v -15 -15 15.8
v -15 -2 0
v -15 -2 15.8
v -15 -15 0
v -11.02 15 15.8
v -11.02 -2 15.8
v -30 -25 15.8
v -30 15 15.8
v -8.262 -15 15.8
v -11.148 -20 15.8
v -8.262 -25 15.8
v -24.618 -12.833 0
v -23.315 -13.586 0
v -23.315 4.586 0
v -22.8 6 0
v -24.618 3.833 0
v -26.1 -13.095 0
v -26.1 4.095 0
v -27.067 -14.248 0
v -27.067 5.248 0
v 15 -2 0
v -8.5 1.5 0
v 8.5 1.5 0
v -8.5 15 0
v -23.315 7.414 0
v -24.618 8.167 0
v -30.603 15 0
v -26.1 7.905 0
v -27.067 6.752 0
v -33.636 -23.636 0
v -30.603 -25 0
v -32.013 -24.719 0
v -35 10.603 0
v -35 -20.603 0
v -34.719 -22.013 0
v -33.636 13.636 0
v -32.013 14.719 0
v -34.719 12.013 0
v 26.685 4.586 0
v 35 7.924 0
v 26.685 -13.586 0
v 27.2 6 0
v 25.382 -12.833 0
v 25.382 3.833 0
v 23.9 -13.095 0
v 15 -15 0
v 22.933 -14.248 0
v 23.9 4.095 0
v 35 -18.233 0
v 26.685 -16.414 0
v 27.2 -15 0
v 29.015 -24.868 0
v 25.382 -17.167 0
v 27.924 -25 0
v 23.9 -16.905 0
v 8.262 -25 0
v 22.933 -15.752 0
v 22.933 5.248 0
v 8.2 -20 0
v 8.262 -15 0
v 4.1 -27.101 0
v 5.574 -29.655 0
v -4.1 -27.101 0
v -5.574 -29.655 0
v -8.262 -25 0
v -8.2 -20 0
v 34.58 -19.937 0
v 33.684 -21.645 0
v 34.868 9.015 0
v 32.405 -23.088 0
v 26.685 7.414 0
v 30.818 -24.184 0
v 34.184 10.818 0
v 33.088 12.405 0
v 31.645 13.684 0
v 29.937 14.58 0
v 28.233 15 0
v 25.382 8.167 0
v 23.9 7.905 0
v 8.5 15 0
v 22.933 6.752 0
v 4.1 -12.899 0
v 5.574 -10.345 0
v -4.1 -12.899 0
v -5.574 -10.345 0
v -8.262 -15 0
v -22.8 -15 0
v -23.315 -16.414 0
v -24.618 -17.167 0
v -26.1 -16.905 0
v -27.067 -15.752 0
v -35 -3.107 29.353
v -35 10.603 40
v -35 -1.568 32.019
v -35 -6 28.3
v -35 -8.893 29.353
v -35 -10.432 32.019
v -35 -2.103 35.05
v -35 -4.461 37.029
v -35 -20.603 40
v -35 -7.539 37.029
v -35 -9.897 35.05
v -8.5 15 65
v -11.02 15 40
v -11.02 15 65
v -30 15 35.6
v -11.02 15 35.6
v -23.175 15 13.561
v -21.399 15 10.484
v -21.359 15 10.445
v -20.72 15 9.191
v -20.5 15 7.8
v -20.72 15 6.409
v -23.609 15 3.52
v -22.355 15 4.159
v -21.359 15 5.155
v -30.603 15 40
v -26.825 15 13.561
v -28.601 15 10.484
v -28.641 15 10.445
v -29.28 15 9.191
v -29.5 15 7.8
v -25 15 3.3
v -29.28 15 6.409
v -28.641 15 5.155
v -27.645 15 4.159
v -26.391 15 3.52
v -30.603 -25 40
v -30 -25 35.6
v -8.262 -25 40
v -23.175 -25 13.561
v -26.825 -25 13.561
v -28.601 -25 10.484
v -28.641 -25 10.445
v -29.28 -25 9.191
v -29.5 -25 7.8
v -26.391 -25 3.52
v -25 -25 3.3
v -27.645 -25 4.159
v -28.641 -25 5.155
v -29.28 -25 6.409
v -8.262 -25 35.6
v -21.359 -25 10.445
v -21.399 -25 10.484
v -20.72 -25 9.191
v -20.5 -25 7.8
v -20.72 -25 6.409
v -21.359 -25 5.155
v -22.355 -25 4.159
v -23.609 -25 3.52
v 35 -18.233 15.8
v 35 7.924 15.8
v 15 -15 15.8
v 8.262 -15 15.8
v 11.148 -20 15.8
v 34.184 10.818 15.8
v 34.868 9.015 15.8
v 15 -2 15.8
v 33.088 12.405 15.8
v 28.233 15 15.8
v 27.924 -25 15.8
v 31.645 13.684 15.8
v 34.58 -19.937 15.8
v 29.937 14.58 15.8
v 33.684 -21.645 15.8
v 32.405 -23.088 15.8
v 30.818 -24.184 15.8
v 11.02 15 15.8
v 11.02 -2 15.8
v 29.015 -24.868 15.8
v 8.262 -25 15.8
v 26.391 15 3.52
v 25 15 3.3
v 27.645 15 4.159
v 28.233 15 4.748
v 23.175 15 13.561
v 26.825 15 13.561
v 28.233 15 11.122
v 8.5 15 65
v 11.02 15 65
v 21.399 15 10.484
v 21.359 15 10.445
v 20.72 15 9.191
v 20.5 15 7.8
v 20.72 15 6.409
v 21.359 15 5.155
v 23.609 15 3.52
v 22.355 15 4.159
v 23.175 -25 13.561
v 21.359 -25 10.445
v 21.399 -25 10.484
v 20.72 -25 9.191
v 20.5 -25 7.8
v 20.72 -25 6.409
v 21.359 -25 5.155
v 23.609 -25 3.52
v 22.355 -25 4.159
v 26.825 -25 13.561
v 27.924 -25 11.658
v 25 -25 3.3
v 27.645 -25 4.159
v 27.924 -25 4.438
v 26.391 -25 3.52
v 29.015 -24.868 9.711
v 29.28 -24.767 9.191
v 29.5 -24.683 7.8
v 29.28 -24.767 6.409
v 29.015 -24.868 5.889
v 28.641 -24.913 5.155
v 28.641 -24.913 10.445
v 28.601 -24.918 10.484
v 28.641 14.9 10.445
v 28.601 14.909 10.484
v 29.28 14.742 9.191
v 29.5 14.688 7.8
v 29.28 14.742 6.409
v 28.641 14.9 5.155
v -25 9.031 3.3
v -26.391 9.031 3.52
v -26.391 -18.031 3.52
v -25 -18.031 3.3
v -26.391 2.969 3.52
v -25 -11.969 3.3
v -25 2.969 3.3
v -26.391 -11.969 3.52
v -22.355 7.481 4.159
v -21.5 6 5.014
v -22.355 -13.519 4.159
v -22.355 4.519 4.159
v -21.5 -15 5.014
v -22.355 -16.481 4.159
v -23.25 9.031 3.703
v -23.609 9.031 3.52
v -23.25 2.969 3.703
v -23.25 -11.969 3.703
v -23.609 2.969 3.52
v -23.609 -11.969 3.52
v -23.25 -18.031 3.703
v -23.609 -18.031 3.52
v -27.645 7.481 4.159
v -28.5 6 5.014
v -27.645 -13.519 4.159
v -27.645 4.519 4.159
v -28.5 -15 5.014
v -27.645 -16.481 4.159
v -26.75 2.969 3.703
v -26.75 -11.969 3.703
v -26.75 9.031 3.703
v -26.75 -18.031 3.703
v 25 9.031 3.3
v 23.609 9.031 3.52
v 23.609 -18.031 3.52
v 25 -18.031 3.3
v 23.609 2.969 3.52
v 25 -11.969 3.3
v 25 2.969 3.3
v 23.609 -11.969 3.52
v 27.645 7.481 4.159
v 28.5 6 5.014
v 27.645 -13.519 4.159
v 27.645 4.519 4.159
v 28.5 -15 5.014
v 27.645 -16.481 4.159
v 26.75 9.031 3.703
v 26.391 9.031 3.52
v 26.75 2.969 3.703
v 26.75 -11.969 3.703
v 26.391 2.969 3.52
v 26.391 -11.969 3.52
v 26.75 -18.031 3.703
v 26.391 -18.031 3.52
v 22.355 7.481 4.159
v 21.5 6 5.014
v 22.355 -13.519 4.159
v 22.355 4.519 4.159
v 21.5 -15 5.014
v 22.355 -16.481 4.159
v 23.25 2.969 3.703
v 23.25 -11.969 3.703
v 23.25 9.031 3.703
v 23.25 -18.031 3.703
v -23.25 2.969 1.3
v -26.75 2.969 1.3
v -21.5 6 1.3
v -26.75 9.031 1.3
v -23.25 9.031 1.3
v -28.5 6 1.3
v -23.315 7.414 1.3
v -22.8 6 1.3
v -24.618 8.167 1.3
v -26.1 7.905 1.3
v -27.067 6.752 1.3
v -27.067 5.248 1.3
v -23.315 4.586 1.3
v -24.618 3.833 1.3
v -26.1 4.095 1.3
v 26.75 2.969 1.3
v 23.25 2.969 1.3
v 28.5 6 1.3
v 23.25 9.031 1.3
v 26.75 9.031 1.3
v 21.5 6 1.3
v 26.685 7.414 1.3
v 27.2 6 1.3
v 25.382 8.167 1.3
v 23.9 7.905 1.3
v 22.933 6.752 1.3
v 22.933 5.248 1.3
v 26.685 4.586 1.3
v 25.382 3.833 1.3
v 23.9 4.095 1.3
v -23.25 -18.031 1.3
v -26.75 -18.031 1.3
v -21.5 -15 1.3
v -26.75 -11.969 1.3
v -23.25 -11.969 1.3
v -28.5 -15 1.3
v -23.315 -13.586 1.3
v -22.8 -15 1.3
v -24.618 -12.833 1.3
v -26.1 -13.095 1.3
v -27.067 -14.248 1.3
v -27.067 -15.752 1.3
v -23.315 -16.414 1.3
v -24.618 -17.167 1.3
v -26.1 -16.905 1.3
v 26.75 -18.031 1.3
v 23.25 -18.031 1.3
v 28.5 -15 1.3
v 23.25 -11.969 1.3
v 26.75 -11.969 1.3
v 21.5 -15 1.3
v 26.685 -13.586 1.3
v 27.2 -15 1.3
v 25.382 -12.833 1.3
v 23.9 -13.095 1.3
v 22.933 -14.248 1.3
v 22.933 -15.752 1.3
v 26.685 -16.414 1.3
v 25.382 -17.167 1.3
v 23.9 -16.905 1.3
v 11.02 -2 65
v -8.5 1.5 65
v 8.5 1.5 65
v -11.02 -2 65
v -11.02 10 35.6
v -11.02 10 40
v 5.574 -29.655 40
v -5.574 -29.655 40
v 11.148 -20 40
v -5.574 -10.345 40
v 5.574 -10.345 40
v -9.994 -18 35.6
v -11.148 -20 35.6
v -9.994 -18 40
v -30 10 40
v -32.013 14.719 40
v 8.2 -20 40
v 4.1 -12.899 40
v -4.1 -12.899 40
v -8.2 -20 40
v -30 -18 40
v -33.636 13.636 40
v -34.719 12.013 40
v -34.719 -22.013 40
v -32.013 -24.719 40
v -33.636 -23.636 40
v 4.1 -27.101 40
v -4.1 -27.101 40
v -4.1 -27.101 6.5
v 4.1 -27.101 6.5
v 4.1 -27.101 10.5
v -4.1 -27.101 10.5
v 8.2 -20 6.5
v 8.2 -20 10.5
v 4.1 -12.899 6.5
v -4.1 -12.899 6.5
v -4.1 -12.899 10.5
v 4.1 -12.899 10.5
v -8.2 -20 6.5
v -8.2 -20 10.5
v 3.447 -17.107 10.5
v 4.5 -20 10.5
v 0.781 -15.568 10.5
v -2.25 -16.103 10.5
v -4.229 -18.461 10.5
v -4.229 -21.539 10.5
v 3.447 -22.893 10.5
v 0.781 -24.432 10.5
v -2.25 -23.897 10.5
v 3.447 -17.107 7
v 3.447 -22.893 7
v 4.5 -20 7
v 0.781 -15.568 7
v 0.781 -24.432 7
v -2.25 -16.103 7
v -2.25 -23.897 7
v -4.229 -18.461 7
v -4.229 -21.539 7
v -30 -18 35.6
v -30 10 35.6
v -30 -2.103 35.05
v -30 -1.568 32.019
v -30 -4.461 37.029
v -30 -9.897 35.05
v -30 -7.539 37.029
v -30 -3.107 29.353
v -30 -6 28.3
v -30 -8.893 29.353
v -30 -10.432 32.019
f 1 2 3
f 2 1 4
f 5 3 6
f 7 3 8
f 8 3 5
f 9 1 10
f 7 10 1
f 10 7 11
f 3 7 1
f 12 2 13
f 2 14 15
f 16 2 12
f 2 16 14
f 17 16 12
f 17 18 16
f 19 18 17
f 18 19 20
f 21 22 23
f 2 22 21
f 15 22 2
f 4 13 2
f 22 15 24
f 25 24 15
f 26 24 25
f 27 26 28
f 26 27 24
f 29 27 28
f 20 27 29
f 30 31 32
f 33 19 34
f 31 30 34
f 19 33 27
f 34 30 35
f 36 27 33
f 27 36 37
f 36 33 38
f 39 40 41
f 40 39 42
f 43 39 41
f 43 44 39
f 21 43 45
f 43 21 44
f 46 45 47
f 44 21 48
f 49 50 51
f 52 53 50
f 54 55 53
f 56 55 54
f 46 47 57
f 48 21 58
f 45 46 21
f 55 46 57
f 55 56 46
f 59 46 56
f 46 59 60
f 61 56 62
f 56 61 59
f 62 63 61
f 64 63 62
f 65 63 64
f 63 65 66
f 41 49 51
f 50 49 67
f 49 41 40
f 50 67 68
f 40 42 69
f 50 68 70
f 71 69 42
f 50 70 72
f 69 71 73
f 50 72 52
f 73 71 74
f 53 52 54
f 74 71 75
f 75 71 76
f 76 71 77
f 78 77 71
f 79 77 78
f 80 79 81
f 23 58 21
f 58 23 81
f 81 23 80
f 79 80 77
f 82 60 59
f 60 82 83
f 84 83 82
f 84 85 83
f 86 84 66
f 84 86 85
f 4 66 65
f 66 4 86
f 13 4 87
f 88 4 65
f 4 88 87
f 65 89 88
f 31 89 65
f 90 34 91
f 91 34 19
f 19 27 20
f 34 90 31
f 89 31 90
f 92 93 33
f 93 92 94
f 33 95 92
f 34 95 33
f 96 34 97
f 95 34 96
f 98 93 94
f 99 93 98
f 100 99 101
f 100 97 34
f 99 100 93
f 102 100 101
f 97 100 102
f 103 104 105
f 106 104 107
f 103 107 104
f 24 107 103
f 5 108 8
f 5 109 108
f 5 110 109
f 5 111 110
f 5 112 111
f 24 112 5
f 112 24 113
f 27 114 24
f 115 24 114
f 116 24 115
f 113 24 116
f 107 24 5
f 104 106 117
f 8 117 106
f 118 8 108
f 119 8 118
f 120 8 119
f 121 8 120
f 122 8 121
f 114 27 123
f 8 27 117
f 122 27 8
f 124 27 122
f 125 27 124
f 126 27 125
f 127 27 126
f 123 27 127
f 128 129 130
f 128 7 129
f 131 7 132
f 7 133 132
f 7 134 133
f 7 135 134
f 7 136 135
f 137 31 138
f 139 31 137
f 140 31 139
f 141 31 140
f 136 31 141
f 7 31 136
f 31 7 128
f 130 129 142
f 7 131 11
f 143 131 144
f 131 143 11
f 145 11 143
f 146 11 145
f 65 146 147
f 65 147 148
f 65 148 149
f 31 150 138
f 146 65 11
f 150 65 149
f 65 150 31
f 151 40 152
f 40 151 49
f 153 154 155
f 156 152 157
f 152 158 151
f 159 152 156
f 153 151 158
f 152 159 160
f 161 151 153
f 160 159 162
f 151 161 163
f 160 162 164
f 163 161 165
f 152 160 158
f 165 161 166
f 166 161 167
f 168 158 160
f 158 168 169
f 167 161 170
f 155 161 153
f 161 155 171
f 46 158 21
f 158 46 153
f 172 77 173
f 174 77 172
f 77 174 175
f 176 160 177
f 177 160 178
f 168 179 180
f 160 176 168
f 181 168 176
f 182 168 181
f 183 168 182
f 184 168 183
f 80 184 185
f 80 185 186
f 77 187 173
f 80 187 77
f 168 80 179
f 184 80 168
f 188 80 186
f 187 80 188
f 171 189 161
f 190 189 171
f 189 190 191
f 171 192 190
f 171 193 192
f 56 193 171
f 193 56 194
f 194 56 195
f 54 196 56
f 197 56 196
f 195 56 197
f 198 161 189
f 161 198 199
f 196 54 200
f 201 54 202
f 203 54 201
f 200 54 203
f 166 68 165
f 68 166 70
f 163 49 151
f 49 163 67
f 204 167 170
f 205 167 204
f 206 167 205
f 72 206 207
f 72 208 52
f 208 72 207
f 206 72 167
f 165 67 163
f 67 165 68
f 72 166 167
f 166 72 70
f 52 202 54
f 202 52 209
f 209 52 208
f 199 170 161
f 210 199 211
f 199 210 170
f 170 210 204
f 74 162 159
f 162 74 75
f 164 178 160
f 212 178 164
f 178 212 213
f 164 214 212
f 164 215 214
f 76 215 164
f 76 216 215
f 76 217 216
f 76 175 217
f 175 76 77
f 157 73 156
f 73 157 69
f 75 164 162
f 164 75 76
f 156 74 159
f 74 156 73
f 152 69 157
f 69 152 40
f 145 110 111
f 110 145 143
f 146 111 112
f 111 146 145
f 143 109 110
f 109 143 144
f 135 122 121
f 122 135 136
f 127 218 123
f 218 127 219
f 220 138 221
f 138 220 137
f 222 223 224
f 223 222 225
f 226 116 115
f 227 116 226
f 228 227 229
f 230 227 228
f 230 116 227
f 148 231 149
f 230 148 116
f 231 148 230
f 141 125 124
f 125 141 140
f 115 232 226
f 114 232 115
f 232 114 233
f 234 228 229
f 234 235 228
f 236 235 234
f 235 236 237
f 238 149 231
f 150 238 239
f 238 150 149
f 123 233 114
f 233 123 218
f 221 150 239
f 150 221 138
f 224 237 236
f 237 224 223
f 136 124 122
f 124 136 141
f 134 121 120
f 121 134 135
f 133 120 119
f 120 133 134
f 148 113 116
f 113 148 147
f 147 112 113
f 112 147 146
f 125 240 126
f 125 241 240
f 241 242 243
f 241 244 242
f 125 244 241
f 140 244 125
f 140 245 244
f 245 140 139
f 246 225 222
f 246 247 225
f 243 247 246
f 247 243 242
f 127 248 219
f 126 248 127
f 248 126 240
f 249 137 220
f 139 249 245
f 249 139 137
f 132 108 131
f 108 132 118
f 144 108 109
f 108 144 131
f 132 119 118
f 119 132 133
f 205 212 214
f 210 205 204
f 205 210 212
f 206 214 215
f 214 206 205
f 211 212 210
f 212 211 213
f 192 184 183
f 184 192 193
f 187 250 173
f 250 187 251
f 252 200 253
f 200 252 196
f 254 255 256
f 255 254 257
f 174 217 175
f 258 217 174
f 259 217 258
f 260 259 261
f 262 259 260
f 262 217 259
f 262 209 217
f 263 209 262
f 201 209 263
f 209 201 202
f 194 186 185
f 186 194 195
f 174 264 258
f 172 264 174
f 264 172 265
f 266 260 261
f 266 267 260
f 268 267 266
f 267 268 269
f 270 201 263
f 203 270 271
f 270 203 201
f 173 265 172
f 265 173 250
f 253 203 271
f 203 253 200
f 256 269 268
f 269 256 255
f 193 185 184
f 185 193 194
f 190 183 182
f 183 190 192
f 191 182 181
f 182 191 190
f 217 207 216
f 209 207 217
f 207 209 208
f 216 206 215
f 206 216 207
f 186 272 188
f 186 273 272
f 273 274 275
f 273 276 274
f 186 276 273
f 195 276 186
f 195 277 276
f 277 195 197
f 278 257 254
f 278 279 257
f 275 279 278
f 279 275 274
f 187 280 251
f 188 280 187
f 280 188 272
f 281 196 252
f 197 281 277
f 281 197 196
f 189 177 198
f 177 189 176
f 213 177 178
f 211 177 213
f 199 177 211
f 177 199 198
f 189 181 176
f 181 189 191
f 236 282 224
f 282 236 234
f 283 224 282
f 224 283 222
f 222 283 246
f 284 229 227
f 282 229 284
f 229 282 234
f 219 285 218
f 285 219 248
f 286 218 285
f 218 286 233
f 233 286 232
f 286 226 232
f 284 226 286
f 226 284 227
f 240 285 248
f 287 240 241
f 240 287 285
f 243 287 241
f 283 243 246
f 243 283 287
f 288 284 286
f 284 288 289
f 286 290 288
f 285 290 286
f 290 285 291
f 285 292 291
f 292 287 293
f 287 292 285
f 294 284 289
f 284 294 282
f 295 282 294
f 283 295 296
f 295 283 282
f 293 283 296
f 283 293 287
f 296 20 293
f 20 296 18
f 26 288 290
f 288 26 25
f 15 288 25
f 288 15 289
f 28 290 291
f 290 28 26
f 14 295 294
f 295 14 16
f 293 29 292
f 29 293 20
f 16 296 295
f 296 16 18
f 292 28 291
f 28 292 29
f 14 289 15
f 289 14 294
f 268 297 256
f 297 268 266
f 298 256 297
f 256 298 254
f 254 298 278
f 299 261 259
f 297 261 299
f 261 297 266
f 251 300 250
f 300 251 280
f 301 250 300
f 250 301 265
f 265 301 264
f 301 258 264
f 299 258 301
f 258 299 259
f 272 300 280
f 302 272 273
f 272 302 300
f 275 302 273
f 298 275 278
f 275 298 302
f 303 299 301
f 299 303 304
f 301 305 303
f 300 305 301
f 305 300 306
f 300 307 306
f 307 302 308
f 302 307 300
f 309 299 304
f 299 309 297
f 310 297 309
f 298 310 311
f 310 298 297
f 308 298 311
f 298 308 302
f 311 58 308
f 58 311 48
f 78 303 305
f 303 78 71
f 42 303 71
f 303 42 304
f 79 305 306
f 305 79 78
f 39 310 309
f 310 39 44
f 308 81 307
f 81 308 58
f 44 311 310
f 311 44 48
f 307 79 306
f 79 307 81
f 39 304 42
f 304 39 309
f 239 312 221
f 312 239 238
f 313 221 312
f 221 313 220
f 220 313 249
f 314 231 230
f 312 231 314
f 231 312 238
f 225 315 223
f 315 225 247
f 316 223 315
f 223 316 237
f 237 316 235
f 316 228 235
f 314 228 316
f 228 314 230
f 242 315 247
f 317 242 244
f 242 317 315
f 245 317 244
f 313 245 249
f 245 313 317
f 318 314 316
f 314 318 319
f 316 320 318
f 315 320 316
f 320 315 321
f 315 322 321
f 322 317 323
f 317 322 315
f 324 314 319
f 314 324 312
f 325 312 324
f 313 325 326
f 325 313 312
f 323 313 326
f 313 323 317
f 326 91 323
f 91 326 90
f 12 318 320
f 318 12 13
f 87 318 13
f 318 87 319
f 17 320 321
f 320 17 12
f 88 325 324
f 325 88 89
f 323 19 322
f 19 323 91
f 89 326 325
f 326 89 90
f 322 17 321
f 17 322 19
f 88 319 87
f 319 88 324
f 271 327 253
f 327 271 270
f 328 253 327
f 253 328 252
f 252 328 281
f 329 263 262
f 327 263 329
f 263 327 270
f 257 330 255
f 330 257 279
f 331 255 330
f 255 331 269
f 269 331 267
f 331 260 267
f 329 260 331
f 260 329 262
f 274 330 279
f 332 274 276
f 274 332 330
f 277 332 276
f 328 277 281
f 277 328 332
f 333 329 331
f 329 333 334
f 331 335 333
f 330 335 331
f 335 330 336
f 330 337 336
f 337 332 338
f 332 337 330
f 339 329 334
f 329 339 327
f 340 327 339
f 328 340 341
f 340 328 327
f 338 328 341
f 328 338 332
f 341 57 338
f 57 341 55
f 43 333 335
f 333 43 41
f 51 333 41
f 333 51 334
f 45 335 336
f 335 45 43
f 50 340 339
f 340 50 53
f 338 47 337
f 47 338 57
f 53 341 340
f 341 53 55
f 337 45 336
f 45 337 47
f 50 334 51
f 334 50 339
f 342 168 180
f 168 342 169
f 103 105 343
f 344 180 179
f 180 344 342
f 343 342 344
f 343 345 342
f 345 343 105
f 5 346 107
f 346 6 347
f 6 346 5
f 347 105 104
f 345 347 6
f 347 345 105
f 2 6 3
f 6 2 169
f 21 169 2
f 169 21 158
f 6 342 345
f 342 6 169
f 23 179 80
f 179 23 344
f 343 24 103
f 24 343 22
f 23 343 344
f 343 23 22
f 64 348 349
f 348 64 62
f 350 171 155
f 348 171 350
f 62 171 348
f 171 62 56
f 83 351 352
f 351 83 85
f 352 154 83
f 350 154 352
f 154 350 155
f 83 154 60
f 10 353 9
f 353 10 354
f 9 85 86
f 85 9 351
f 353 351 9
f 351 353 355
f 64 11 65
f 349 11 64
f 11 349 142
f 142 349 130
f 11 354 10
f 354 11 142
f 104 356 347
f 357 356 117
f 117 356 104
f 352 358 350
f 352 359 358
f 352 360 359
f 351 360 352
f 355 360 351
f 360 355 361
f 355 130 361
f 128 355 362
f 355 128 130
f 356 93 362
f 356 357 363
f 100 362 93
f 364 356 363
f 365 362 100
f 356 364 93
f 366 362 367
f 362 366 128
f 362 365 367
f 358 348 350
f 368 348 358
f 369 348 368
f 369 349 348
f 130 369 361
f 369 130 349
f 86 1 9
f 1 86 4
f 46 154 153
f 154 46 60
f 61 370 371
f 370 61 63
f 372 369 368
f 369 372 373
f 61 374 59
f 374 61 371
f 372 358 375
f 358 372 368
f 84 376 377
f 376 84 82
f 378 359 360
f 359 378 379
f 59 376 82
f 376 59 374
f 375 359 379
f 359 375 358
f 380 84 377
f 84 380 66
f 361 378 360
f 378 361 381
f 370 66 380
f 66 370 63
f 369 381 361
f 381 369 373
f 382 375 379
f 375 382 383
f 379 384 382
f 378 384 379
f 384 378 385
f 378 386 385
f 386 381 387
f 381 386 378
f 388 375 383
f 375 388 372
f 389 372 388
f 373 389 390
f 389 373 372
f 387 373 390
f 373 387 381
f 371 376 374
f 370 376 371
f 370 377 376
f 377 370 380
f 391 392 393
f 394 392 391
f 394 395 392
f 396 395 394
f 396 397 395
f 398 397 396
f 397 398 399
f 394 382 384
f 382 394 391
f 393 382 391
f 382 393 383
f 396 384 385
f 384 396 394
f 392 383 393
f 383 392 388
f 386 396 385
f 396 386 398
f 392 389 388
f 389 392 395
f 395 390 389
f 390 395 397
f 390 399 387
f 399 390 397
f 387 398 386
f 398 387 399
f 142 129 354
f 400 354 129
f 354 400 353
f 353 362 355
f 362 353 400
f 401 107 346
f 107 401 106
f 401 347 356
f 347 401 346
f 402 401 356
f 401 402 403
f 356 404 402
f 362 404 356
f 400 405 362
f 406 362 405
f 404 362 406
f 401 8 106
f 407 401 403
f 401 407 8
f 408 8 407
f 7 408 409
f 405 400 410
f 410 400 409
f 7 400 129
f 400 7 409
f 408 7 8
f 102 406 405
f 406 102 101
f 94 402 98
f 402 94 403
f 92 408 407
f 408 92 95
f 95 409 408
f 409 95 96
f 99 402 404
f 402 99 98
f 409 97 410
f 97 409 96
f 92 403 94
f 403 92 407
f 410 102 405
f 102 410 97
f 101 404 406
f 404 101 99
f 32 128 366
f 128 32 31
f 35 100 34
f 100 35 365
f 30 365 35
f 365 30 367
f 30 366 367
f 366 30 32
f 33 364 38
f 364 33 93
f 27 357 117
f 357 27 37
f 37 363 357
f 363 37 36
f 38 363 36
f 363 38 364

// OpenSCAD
// file: configuration.scad
// PRUSA Mendel  
// Configuration file
// GNU GPL v2
// Josef Pra
// josefprusa@me.com
// prusadjs.cz
// http://www.reprap.org/wiki/Prusa_Mendel
// http://github.com/prusajr/PrusaMendel


// PLEASE SELECT ONE OF THE CONFIGURATIONS BELOW
// BY UN-COMMENTING IT


variant=0; //0 for metric
//variant=1; //1 for SAE
if(variant==0){
echo("variant: metric");
}else if(variant==1){
echo("variant: sae");
} else{
echo("WARNING: INVALID CONFIGURATION");
}




vars=[
//[m8_dia, m8_nut, m4_dia, m4_nut, m3_dia, m3_nut, bush_dia, mot_shaft, bush_rod, bush_outerdia, bush_length]
[9,16.4,5,9,4.4,7,11,5.3,8,16,11],//metric
[9,15.7,5.5,10.6,5.5,10.6,11.5,5.3,7.9375,16,11]//SAE
];


//BUSHING TYPE Can generate three versions
// 1 - regular old ones
// 2 - helical ones
// 3 - holders for brass or any other bought bushings
bushing_type = 2;


//Round corner diameter
round_corner_diameter = 8;


//Thin wall size
layer_height = 0.4;
perimeter_width_over_thicknes = 1.6;
infill_widht_over_thickness = 1.55;
thin_wall = 2*(perimeter_width_over_thicknes*layer_height+infill_widht_over_thickness*layer_height);
if(thin_wall<2){
	echo("Check thin wall size, its below 2mm!");
}
echo(thin_wall);


//DO NOT TOUCH THIS SECTION!
m8_diameter = vars[variant][0];
m8_nut_diameter = vars[variant][1];
m4_diameter = vars[variant][2];
m4_nut_diameter = vars[variant][3];
m3_diameter = vars[variant][4];
m3_nut_diameter = vars[variant][5];
bushing_diameter = vars[variant][6];
motor_shaft=vars[variant][7];
bushing_rodsize = vars[variant][8];
bushing_outerDiameter = vars[variant][9];
bushing_lenght = vars[variant][10];




// MINI-HUXLEY VERSION (TODO, just place holder)
// include <configuration-huxley.scad>


// MEGA VERSION (TODO, just place holder)
// include <configuration-mega.scad>




// Some basic functions, probably should be somewhere else
module roundcorner(diameter){
	difference(){
		cube(size = [diameter,diameter,99], center = false);
		translate(v = [diameter, diameter, 0]) cylinder(h = 100, r=diameter, center=true);
	}
}
// main file
// PRUSA Mendel 
// X-end with idler mount
// GNU GPL v2
// Josef Pra
// josefprusa@me.com
// prusadjs.cz
// http://www.reprap.org/wiki/Prusa_Mendel
// http://github.com/prusajr/PrusaMendel


include <configuration.scad>
corection = 1.17; 


/**
 * @id x-end-idler
 * @name X end idler
 * @category Printed
 * @using 2 bushing
 * @using 1 m8spring
 * @using 2 m8nut
 */ 


module xendidler(){
difference(){
translate(v = [0,35,24.5]) union(){ 


difference(){
union(){
translate(v = [-25, -40, -16.6])cube(size = [20,40,15.8], center = true);
translate(v = [25, -40, -16.6])cube(size = [20,40,15.8], center = true);
}
//nut traps


translate(v = [-25, -29, -19.7]) cylinder(h = 7, r=m3_nut_diameter/2, $fn=6, center=true);
translate(v = [-25, -29, -20]) cylinder(h = 10, r=m3_diameter/2, $fn=9, center=true);
translate(v = [25, -29, -19.7]) cylinder(h = 7, r=m3_nut_diameter/2, $fn=6, center=true);
translate(v = [25, -29, -20]) cylinder(h = 10, r=m3_diameter/2, $fn=9, center=true);


translate(v = [-25, -50, -19.7]) cylinder(h = 7, r=m3_nut_diameter/2, $fn=6, center=true);
translate(v = [-25, -50, -20]) cylinder(h = 10, r=m3_diameter/2, $fn=9, center=true);
translate(v = [25, -50, -19.7]) cylinder(h = 7, r=m3_nut_diameter/2, $fn=6, center=true);
translate(v = [25, -50, -20]) cylinder(h = 10, r=m3_diameter/2, $fn=9, center=true);




//round corners
translate(v = [35.1, -60.1, -25]) rotate(a=[0,0,90]) roundcorner(round_corner_diameter);
translate(v = [35.1, -19.9, -25]) rotate(a=[0,0,-180]) roundcorner(round_corner_diameter);




//holes for axis
translate(v = [-25, -18, -16.7]) rotate(a=[90,0,0]) {
translate(v = [0, 0, 22]) cylinder(h = 42, r=4.5, $fn=20, center=true);
translate(v = [0, 2.60, 22]) rotate(a=[0,0,0]) cylinder(h = 42, r=3.65, $fn=6, center=true);
}
translate(v = [25, -18, -16.7]) rotate(a=[90,0,0]) {
translate(v = [0, 0, 22]) cylinder(h = 42, r=4.5, $fn=20, center=true);
translate(v = [0, 2.60, 22]) rotate(a=[0,0,0]) cylinder(h = 42, r=3.65, $fn=6, center=true);
}
//slider cutouts
translate(v = [0, -25, 15]) 
difference(){
translate(v = [0, -0, -14.5])cube(size = [23,23,50], center = true);
}
//nut trap
translate(v = [0, -55, 15]) {
difference(){
translate(v = [0, -0, -15])cylinder(h = 50, r=m8_nut_diameter/2+thin_wall, $fn=6, center=true);
}
}
}


//slider
translate(v = [0, -25, 15]) 
difference(){
union(){
translate(v = [0, -3.5, -7]) cube(size = [17+2*thin_wall,17,65], center = true);


translate(v = [0, -3.5, -31.6]) cube(size = [33,17,15.8], center = true);}
translate(v = [0, -0, -7])cube(size = [17,17,70], center = true);}


//nut trap
//correction for thin wall






translate(v = [0, -55, 15]) {
difference(){
union(){difference(){
union(){
translate(v = [0, -0, -19.5])cylinder(h = 40, r=m8_nut_diameter/2+thin_wall*corection, $fn=6, center=true);
translate(v = [0, 0, -31.6]) cube(size = [35,10,15.8], center = true);}
cylinder(h = 90, r=m8_nut_diameter/2, $fn=6, center=true);
}
translate(v = [0, 0, -31]) cylinder(h = 4, r=m8_nut_diameter/2+thin_wall, $fn=6, center=true);
}
translate(v = [0, 0, 12.5]) cylinder(h = 90, r=m8_diameter/2, $fn=9, center=true);
}
}




//idler wheel connector
mirror(){
translate(v = [0, -35, -12]) difference(){
union(){
translate(v = [21, -21.5, 25.3]) cube(size = [25.5,7,4.4], center = true);
translate(v = [21, 12.5, 25.3]) cube(size = [24,5,4.4], center = true);
translate(v = [32.5, -5, 12.5]) cube(size = [5,40,30], center = true);
}


translate(v = [32.5, -6, 28-3-4.7]) rotate(a=[0,90,0]) cylinder(h = 90, r=m8_diameter/2, $fn=9, center=true);
//translate(v = [35.1,-25.1,-5]) rotate(a=[0,0,90]) roundcorner(3);
//translate(v = [-35.1, -19.9, -25]) rotate(a=[0,0,-90]) roundcorner(3);


}
}}


//two more rounded corners
translate(v = [-35.1,-25.1,-5]) rotate(a=[0,0,0]) roundcorner(5);
translate(v = [-35.1, +15.1, -5]) rotate(a=[0,0,-90]) roundcorner(5);
}
}
xendidler();
